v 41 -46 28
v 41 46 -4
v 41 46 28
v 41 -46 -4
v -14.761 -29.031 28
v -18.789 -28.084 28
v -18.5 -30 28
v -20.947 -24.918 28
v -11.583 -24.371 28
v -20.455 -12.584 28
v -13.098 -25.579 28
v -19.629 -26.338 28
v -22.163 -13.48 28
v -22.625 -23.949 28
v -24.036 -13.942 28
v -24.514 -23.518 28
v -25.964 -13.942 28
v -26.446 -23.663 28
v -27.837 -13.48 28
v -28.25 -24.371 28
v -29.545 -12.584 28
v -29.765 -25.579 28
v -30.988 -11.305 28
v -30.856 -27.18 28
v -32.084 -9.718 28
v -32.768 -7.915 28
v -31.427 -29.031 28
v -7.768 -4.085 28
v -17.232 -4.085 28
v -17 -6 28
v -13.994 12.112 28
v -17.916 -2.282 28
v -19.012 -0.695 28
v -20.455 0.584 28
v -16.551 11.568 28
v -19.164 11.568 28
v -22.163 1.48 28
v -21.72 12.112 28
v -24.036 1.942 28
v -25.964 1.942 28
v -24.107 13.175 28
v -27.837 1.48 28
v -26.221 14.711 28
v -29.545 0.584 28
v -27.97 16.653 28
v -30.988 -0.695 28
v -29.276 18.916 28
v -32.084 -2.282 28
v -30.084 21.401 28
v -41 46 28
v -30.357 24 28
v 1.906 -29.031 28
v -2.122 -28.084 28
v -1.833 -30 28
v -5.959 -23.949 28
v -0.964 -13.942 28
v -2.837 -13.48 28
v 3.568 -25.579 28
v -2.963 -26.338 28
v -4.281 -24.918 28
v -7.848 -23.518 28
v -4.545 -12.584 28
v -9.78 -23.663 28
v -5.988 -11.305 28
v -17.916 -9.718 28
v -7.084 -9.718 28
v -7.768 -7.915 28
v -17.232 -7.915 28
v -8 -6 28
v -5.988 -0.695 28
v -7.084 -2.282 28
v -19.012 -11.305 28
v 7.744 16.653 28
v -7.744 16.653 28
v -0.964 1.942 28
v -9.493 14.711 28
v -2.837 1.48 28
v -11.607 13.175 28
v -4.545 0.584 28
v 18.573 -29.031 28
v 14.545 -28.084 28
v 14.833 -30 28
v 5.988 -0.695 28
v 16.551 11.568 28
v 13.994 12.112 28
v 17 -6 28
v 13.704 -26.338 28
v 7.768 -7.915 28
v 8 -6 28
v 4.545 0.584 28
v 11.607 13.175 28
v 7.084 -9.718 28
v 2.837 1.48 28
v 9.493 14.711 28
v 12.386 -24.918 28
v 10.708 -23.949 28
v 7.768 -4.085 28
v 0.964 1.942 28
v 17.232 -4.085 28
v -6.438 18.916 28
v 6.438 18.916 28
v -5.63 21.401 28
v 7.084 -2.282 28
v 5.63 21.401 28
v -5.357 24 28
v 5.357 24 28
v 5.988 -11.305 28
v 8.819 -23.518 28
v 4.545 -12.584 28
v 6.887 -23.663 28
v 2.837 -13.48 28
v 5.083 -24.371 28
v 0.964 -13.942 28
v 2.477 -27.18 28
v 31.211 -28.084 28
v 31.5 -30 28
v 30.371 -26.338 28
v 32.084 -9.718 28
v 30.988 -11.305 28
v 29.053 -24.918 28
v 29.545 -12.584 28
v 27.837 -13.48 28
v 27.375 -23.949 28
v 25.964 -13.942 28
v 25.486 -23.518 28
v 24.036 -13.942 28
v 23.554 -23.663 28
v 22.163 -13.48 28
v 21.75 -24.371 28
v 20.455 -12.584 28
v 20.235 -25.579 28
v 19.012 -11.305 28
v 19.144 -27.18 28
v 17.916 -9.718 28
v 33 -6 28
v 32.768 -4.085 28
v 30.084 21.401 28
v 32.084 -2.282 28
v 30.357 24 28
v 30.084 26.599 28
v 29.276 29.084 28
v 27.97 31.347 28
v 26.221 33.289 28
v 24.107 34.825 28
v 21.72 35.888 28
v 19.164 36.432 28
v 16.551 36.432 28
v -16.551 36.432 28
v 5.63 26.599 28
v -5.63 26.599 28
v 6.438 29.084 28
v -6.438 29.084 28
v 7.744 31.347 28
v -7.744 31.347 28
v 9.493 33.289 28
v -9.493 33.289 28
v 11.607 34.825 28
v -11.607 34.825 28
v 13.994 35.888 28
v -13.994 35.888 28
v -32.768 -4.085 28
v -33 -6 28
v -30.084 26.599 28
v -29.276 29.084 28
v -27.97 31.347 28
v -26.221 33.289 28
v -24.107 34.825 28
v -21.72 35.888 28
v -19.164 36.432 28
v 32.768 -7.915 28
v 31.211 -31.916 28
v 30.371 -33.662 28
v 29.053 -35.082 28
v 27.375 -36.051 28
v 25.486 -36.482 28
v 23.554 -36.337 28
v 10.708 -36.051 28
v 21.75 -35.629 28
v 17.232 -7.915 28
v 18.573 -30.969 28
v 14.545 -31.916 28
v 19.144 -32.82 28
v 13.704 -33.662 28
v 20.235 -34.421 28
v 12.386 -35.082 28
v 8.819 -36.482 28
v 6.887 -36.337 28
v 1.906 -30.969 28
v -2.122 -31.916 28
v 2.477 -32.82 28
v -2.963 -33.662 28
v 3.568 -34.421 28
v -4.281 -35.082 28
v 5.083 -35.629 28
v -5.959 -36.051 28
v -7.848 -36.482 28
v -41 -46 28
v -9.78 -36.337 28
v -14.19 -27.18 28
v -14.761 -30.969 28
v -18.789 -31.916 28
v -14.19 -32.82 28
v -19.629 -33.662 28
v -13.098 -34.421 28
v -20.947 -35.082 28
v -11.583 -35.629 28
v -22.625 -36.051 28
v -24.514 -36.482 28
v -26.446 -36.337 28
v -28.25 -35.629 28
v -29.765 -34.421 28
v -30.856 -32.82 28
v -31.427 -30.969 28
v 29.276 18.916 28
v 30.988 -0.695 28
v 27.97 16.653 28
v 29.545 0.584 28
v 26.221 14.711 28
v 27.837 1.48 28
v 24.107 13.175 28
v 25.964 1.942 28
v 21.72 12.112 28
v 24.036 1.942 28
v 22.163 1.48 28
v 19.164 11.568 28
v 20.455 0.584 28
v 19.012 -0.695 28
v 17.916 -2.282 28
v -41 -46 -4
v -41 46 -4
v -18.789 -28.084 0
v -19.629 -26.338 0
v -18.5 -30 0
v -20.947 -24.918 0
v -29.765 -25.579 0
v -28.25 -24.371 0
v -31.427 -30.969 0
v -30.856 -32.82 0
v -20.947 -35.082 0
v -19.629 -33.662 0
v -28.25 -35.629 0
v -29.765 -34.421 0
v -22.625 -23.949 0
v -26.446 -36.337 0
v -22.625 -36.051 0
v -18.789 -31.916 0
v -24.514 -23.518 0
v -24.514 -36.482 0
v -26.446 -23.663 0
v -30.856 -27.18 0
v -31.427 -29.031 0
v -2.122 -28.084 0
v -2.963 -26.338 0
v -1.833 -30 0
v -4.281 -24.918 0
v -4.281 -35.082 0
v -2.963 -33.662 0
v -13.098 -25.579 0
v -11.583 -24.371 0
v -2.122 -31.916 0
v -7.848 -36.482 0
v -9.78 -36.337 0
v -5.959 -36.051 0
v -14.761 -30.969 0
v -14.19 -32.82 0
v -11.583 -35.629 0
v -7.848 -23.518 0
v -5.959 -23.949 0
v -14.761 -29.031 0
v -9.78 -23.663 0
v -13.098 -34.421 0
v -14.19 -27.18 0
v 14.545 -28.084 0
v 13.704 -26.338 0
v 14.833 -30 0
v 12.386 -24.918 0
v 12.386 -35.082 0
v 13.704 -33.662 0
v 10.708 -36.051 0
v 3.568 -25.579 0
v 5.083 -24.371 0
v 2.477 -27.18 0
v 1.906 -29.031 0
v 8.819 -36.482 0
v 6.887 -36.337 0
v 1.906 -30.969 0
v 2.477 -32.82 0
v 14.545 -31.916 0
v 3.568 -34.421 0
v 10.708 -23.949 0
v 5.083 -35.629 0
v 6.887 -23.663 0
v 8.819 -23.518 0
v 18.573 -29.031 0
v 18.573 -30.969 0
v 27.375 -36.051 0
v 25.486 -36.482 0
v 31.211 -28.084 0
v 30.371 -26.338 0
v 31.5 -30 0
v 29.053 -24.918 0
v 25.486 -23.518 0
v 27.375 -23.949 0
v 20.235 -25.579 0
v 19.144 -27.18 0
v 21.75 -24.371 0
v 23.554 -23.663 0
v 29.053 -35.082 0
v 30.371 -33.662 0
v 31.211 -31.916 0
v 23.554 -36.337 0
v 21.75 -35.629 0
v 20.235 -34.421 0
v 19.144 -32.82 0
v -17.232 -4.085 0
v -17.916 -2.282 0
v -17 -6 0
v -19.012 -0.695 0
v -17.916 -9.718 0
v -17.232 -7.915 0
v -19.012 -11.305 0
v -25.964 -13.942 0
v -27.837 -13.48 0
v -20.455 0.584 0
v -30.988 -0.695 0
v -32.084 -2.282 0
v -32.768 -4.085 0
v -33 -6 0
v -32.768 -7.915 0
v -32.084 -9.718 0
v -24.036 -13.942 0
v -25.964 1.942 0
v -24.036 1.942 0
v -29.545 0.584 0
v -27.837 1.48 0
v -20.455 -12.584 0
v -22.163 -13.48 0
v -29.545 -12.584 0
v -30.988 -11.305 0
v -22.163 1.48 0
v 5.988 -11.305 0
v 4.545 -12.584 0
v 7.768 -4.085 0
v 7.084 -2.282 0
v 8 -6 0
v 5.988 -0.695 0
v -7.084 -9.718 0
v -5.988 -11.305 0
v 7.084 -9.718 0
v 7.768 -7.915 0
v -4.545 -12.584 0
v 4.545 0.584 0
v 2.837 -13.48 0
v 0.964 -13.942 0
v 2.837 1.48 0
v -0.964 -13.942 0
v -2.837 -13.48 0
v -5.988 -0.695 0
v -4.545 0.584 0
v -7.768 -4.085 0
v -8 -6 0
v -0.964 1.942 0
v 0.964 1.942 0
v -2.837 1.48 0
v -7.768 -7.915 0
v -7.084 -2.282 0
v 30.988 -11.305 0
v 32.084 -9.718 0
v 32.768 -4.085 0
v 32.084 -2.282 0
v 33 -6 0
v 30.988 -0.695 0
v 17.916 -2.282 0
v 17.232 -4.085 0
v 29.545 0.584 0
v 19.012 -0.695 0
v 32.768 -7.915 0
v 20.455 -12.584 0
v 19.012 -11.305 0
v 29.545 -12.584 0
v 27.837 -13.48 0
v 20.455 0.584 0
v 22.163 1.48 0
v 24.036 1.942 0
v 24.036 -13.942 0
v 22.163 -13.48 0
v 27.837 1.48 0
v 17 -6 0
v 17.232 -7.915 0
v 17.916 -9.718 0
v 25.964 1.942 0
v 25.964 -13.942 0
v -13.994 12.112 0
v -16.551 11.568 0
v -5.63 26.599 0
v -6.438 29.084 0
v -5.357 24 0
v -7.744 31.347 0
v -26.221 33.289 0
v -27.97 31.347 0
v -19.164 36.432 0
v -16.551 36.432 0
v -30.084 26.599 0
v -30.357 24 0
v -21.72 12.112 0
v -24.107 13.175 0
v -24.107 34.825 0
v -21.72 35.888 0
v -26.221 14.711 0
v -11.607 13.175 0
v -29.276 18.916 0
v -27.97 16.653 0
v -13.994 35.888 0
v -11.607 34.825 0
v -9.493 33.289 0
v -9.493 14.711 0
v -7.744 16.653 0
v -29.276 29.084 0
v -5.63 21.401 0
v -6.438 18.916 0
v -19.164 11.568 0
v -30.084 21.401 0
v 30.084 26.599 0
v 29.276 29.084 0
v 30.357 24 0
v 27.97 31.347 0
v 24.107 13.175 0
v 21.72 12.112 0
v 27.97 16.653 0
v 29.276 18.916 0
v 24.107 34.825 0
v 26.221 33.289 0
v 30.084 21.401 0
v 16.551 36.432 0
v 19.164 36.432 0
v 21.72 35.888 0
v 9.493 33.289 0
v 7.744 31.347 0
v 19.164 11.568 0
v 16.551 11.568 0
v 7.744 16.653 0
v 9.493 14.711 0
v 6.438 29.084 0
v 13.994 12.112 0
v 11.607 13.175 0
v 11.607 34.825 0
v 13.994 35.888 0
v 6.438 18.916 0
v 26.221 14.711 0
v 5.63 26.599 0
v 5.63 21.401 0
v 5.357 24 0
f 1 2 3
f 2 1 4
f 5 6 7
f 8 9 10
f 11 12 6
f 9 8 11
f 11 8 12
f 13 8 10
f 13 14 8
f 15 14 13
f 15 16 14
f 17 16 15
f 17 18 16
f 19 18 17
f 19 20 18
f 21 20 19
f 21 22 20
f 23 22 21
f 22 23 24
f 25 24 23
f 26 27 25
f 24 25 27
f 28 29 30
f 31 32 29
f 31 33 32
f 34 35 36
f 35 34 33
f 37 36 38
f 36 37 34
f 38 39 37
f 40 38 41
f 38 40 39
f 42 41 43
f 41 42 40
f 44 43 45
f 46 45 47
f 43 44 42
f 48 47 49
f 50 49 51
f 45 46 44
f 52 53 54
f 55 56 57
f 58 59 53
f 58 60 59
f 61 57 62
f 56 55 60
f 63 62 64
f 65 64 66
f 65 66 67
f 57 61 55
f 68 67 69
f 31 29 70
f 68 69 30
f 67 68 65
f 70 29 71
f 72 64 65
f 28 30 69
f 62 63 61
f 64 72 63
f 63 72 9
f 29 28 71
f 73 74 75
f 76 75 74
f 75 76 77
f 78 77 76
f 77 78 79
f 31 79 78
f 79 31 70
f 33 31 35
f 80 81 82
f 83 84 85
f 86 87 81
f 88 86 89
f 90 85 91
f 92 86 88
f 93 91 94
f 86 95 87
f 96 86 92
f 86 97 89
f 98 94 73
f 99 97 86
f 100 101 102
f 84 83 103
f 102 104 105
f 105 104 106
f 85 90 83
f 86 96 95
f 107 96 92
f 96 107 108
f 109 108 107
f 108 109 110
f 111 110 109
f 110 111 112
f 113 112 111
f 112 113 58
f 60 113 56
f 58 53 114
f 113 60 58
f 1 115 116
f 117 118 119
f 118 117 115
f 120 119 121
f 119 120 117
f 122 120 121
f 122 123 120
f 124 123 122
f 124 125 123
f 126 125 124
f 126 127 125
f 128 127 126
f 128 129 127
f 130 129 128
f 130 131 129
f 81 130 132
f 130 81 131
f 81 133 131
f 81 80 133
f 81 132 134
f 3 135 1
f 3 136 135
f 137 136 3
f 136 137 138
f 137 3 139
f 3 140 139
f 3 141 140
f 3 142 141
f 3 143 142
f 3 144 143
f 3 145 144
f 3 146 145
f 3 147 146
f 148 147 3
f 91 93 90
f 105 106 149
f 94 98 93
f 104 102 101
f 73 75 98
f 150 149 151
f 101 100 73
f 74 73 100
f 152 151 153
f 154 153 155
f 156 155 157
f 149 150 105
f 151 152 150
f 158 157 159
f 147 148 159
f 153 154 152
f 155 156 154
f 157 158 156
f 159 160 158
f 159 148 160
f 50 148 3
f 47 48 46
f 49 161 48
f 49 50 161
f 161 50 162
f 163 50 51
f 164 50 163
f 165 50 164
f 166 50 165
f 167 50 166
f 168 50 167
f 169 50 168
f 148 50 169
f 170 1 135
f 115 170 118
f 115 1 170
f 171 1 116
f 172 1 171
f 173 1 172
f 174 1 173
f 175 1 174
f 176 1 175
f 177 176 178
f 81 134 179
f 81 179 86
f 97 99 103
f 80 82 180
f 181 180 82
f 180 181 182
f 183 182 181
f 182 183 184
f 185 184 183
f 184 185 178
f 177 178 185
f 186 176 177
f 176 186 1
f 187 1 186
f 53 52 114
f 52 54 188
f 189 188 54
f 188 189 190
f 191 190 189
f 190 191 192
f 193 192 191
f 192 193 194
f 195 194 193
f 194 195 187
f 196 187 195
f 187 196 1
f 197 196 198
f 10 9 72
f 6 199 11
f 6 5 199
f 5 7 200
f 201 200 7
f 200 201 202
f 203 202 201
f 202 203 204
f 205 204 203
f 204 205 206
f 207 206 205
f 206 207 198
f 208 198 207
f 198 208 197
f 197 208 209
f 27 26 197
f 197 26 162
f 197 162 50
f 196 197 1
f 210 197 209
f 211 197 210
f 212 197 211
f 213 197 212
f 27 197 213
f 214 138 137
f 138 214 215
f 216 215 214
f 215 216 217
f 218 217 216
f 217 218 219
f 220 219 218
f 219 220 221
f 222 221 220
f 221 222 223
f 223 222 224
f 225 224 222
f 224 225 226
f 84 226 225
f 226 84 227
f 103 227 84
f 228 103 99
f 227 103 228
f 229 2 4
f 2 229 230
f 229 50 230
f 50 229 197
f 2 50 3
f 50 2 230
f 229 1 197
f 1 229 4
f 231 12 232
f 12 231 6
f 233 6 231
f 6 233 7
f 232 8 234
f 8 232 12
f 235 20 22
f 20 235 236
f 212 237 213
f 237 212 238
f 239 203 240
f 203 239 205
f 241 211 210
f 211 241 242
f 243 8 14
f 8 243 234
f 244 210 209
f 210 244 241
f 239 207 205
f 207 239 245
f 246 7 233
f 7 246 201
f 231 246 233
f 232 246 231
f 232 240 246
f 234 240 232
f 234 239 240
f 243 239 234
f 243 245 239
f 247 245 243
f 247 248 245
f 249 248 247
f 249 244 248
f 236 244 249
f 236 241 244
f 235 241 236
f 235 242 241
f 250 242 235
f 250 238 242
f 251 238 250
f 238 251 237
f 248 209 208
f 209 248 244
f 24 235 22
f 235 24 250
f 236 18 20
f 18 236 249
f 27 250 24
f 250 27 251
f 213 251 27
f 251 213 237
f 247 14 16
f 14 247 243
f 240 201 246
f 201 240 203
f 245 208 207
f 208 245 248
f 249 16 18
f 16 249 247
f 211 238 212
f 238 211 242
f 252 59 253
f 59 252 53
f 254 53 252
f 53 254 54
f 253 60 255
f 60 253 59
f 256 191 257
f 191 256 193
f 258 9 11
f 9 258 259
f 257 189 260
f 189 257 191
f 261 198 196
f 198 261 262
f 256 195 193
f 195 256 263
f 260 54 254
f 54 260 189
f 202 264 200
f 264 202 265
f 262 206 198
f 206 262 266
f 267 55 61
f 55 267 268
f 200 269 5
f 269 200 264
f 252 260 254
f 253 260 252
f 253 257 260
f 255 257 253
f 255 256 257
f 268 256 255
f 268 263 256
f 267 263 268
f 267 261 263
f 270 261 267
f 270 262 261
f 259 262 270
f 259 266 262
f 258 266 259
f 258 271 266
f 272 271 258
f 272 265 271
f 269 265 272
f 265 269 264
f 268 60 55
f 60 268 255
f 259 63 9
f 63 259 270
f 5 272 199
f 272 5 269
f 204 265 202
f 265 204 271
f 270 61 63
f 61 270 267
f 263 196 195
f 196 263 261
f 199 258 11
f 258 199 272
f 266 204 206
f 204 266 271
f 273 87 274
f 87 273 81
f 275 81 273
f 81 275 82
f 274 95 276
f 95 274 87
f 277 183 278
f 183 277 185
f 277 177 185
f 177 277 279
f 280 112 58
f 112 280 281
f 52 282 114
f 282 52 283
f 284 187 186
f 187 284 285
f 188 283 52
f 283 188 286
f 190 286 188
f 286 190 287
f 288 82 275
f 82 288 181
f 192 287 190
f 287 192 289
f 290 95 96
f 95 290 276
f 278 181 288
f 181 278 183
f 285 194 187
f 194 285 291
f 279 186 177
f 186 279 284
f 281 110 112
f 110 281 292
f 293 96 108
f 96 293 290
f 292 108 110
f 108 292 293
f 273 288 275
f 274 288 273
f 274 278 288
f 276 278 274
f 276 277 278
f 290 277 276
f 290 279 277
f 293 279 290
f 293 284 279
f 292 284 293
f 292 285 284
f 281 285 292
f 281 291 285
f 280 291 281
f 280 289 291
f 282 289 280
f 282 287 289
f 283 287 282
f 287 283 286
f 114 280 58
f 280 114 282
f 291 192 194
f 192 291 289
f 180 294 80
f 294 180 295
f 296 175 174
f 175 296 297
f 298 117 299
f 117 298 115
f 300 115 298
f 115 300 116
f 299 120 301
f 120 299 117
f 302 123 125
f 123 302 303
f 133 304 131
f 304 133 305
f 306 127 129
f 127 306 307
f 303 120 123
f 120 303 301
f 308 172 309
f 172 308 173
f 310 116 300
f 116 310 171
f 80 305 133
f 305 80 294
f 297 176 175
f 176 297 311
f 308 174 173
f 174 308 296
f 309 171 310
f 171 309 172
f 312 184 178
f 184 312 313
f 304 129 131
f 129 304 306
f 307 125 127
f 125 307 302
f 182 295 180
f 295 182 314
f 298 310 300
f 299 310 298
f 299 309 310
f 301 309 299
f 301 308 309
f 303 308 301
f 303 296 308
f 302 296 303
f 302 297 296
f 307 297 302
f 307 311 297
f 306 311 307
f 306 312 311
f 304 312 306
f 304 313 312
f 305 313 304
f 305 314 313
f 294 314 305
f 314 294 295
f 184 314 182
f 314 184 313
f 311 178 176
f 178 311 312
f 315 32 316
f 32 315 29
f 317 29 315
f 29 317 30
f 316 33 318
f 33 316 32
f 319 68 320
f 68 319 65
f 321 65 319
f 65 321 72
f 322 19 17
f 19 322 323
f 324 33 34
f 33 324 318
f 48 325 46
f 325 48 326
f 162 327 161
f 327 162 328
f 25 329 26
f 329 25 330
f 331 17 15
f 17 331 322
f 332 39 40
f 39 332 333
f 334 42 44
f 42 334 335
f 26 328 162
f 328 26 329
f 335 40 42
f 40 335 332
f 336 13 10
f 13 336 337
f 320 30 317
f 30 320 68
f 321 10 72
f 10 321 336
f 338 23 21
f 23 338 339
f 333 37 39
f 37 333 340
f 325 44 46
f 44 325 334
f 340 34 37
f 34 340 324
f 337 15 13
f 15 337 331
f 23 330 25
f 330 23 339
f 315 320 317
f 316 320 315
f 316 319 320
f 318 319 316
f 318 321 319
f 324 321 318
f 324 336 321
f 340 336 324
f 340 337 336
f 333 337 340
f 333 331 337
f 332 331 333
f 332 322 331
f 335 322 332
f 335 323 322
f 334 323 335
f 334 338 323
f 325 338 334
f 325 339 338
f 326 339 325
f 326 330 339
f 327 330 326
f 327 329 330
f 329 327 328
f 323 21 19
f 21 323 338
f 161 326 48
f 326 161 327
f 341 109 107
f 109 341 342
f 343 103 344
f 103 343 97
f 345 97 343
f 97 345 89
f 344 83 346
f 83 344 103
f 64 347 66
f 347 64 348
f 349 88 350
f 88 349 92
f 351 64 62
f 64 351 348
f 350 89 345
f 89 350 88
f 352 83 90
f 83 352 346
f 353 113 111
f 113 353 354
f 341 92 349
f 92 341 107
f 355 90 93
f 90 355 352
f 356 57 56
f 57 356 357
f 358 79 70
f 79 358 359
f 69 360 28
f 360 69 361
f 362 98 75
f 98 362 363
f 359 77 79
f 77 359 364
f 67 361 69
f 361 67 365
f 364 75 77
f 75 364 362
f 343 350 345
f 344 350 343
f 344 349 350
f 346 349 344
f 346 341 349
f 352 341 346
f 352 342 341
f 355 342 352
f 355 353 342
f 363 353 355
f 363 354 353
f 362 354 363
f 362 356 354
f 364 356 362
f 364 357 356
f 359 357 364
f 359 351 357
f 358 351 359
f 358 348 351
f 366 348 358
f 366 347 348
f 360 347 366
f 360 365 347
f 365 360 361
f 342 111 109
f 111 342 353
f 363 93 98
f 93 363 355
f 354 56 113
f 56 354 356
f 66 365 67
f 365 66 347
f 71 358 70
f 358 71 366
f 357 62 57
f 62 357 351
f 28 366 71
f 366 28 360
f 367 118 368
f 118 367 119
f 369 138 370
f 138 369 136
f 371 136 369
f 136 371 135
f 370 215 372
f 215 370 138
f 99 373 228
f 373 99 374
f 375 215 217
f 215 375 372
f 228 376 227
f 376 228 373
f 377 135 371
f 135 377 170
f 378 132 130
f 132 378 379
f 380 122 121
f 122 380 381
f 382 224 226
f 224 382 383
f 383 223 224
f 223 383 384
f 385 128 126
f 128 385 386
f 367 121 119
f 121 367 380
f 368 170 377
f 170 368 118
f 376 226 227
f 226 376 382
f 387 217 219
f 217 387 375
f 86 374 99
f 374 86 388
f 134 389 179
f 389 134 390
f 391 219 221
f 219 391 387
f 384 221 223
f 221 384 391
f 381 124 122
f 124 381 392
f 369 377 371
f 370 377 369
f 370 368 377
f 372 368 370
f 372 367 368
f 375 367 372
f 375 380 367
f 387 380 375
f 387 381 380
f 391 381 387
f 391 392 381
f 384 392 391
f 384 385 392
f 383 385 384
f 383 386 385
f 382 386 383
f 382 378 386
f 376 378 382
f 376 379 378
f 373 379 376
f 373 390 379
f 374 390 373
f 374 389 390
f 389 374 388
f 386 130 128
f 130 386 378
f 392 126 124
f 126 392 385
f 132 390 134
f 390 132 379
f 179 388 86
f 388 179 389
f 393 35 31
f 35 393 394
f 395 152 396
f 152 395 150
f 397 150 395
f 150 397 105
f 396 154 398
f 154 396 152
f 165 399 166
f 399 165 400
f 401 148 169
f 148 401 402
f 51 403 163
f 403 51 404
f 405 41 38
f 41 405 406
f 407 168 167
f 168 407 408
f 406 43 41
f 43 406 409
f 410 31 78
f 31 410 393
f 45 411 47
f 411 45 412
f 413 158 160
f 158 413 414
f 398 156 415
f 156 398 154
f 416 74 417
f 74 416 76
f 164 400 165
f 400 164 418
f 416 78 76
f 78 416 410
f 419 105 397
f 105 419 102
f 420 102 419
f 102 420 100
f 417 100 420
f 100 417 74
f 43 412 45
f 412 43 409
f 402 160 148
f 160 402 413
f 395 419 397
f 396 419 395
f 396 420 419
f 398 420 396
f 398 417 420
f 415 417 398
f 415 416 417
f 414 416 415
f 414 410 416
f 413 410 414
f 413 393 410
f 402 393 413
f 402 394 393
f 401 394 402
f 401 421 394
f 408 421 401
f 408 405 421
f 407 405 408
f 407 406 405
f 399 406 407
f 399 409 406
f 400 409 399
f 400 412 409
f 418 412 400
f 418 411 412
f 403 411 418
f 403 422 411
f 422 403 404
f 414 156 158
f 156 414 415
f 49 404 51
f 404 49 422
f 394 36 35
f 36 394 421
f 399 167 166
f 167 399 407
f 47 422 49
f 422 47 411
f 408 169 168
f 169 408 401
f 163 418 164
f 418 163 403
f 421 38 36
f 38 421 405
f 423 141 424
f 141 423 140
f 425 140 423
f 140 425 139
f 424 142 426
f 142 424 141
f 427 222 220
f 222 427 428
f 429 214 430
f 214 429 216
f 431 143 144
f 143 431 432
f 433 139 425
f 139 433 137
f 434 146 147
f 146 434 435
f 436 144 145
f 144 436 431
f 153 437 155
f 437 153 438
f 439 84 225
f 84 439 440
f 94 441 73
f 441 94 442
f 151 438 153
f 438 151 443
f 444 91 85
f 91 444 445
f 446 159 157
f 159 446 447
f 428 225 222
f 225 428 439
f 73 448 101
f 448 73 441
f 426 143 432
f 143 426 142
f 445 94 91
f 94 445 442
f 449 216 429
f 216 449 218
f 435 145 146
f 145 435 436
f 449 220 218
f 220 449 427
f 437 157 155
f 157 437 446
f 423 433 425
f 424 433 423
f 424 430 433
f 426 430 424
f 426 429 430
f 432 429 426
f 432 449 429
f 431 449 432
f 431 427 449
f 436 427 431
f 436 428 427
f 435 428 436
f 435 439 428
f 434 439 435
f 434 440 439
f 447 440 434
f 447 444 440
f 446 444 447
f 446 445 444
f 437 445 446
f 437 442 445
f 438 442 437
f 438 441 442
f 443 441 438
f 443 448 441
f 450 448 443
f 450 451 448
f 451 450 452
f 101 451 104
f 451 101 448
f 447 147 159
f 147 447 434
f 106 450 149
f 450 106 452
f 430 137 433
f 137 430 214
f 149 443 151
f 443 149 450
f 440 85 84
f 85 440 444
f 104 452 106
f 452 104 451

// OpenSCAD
eps_hole = 2;

module holes(total_width, total_length, height, rows_of_hole_diameters) {
  n_rows = len(rows_of_hole_diameters);
  space_between_rows = n_rows > 1 ? total_length / (n_rows - 1) : 0;

  for (i = [0:(n_rows-1)]) {
    row = rows_of_hole_diameters[i];
    n_cols = len(row);
    
    space_between_cols = n_cols > 1 ? total_width / (n_cols - 1) : 0;
    
    for (j = [0:(n_cols-1)]) {
      offset_x = n_cols > 1 ? -0.5*total_width + j*space_between_cols : 0;
      offset_y = n_rows > 1 ? -0.5*total_length + (i > 0 ? i-0.2 : 0)*space_between_rows : 0;
      if (row[j] > 0) {
        translate([offset_x, offset_y, 0]) cylinder(h=height, d=row[j]+eps_hole);
      }
    }
  }

}

module hole_bridge(total_width, total_length, height, rows_of_hole_diameters, row_idx, hole_l_idx) {
  n_rows = len(rows_of_hole_diameters);
  space_between_rows = total_length / (n_rows - 1);
  
  row = rows_of_hole_diameters[row_idx];
  n_cols = len(row);
    
  space_between_cols = total_width / (n_cols - 1);
  
  bridge_depth = max(row[hole_l_idx], row[hole_l_idx+1]) + eps_hole;

  hole_r_idx = hole_l_idx + 1;
  offset_x = -0.5*total_width + (hole_l_idx+0.5)*space_between_cols;
  offset_y = -0.5*total_length + row_idx*space_between_rows;
  
  translate([offset_x, offset_y, 0.5*height]) cube([space_between_cols, bridge_depth, height], center=true);
}

border = 32;
width = 50;
length = 60;
hole_diameters = [
  [11, 11, 11, 11],
  [14, 14, 14],
  [0, 23, 0, 0, 0, 0, 23, 0],
  //[ 11, 11, 11, 11, 11],
  //[ 14, 14, 14, 14 ],
  //[ 23, 23 ]
];

// I think the 25 needs to be smaller
// I think the shelf thickness needs to be more

thick_shelf_l = 28;
thick_shelf_h = 28;
f_shelf_l = 1.0;
f_shelf_w = 0.675;
thick_floor = 4;
// length/2+25-.45*length, 20]) cube([.675*width, 0.9*length, 40], center=true)

difference() {
  translate([0, 0, -thick_floor]) union() {
    translate([0, 0, 0.5*(thick_shelf_l+thick_floor)]) cube([width + border, length + border, thick_shelf_l+thick_floor], center=true);
    translate([0, 0.5*(1-f_shelf_l)*length+0.5*border, 0.5*(thick_shelf_h+thick_floor)]) cube([f_shelf_w*width, f_shelf_l*length, thick_shelf_h+thick_floor], center=true);
  };
  holes(width, length, 60, hole_diameters);
  //hole_bridge(100, length, 60, hole_diameters, 2, 1);
};
